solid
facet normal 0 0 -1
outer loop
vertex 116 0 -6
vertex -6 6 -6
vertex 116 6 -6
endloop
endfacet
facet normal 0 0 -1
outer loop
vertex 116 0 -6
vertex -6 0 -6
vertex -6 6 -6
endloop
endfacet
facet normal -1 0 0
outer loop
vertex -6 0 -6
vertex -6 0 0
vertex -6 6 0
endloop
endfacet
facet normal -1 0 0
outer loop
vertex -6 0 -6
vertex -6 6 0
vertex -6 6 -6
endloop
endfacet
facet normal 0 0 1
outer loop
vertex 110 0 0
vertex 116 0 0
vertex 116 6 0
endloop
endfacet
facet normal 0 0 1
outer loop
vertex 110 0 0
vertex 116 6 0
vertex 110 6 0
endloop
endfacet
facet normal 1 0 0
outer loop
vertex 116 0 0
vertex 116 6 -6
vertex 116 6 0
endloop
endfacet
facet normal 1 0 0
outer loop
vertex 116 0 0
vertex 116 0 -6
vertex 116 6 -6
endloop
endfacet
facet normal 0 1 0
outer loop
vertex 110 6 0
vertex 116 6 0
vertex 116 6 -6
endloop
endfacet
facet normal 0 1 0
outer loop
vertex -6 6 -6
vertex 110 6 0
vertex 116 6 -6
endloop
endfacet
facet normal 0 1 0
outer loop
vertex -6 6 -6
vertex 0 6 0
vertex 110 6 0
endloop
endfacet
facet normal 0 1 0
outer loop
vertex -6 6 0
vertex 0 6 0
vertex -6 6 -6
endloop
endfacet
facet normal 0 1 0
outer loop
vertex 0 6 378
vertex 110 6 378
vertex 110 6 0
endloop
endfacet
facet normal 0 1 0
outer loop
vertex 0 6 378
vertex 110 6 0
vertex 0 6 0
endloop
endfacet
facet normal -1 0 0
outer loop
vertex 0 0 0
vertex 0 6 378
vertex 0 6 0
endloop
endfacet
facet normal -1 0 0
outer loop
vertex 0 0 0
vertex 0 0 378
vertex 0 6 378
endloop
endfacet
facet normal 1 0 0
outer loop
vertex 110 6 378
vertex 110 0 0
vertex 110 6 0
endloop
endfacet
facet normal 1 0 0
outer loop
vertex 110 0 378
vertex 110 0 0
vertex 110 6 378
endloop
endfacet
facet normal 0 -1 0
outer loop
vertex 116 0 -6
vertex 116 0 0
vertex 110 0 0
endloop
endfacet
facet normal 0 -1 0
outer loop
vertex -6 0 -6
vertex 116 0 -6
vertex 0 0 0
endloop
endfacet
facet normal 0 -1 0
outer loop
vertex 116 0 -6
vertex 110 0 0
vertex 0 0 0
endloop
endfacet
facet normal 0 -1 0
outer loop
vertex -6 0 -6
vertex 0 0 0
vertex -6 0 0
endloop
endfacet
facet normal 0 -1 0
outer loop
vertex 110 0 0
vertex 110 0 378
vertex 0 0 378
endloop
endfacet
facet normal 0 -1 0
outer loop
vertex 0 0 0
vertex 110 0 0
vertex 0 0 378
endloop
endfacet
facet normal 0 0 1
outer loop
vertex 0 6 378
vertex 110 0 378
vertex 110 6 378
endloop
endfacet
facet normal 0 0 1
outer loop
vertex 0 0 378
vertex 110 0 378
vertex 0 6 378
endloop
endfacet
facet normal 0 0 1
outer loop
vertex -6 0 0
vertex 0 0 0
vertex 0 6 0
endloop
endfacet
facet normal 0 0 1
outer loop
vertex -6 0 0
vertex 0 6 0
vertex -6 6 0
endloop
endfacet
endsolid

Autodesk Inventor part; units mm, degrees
ref_plane "YZ Plane" through (0, 0, 0) normal (1, 0, 0) x (0, 1, 0)
ref_plane "XZ Plane" through (0, 0, 0) normal (0, 1, 0) x (-1, 0, 0)
ref_plane "XY Plane" through (0, 0, 0) normal (0, 0, 1) x (1, 0, 0)
sketch "Sketch1" plane through (0, 0, 0) normal (0, 1, 0) x (-1, 0, 0)
  line L0 (0, 0) -> (6, 0)
  line L1 (6, 0) -> (6, -6)
  line L2 (6, -6) -> (0, -6)
  line L3 (0, -6) -> (0, 0)
  line L4 (0, -6) -> (-55, -6)
  line L5 (-55, -6) -> (-55, 378)
  line L6 (-55, 378) -> (0, 378)
  line L7 (0, 378) -> (0, -6)
  dimension "d0" = 6
  dimension "d1" = 6
  dimension "d2" = 55
  dimension "d3" = 384
extrude "Extrusion1" add sketch "Sketch1" along normal blind 6
mirror "Mirror1" about plane through (55, 0, 378) normal (1, 0, 0) of "Extrusion1"
properties part number "wall 2 for sorting"
